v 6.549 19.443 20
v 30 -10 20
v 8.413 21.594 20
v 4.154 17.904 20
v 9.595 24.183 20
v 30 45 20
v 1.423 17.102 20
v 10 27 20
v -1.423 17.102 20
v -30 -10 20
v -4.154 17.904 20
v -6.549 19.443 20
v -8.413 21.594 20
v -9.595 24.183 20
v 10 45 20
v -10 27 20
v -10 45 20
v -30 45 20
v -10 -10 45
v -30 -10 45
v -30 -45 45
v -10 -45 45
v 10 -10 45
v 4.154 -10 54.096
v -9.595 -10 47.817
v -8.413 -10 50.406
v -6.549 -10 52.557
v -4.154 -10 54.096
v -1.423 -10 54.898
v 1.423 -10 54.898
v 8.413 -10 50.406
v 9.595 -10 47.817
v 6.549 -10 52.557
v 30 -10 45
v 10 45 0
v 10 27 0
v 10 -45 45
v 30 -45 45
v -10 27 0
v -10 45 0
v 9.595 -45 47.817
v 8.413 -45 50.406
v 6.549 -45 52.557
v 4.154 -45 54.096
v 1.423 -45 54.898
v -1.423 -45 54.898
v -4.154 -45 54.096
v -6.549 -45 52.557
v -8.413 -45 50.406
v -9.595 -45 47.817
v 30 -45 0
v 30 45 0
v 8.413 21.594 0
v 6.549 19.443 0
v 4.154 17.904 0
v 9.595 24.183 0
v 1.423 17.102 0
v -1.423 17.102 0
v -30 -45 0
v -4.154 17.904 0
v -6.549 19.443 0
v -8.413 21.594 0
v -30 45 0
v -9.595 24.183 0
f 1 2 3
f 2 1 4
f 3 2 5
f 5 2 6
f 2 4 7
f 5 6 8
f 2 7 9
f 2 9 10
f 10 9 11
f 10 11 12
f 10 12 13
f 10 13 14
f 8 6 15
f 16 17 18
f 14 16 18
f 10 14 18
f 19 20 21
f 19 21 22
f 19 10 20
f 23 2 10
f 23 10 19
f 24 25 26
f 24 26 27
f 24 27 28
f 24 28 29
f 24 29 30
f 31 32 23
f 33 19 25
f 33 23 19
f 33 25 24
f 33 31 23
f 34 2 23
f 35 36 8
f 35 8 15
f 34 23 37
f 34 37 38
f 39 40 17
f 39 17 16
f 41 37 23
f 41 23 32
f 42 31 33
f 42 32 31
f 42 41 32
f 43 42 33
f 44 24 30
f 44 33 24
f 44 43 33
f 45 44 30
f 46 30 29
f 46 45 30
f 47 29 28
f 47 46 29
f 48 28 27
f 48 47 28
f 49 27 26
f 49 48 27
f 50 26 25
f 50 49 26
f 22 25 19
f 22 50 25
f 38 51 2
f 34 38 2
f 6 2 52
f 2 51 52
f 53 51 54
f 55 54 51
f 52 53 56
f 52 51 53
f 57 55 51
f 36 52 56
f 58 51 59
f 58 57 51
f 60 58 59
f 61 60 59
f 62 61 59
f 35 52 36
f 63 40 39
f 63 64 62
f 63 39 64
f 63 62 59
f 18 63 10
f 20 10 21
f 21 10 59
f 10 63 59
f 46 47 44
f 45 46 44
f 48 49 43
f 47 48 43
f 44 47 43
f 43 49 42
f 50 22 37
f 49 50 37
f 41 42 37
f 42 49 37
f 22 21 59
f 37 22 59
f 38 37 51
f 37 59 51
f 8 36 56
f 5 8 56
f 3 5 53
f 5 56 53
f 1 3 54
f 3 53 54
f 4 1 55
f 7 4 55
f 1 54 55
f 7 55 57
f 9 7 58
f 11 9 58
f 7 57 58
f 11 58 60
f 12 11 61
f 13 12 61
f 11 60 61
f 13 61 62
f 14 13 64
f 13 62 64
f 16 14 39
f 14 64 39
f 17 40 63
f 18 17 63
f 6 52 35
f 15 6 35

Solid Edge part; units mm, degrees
sketch "Sketch1" plane through (0, 0, 0) normal (0, 0, 1) x (1, 0, 0)
  line L0 (-10, 45) -> (-10, 27)
  line L1 (10, 27) -> (10, 45)
  line L2 (30, 45) -> (10, 45)
  line L3 (30, -45) -> (30, 45)
  line L4 (-30, -45) -> (30, -45)
  line L5 (-30, 45) -> (-30, -45)
  line L6 (-10, 45) -> (-30, 45)
  arc A0 (10, 27) -> (-10, 27) centre (0, 27) cw
extrude "Protrusion1" add sketch "Sketch1" along normal blind 20
sketch "Sketch2" plane through (0, -45, 10) normal (0, -1, 0) x (1, 0, 0)
  line L0 (30, 35) -> (30, 10)
  line L1 (10, 35) -> (30, 35)
  line L2 (-30, 35) -> (-10, 35)
  line L3 (-30, 10) -> (-30, 35)
  arc A0 (-10, 35) -> (10, 35) centre (0, 35) cw
extrude "ExtrudedProtrusion_2" add sketch "Sketch2" against normal blind 35 material side at (30.05, -45, 32.5)
